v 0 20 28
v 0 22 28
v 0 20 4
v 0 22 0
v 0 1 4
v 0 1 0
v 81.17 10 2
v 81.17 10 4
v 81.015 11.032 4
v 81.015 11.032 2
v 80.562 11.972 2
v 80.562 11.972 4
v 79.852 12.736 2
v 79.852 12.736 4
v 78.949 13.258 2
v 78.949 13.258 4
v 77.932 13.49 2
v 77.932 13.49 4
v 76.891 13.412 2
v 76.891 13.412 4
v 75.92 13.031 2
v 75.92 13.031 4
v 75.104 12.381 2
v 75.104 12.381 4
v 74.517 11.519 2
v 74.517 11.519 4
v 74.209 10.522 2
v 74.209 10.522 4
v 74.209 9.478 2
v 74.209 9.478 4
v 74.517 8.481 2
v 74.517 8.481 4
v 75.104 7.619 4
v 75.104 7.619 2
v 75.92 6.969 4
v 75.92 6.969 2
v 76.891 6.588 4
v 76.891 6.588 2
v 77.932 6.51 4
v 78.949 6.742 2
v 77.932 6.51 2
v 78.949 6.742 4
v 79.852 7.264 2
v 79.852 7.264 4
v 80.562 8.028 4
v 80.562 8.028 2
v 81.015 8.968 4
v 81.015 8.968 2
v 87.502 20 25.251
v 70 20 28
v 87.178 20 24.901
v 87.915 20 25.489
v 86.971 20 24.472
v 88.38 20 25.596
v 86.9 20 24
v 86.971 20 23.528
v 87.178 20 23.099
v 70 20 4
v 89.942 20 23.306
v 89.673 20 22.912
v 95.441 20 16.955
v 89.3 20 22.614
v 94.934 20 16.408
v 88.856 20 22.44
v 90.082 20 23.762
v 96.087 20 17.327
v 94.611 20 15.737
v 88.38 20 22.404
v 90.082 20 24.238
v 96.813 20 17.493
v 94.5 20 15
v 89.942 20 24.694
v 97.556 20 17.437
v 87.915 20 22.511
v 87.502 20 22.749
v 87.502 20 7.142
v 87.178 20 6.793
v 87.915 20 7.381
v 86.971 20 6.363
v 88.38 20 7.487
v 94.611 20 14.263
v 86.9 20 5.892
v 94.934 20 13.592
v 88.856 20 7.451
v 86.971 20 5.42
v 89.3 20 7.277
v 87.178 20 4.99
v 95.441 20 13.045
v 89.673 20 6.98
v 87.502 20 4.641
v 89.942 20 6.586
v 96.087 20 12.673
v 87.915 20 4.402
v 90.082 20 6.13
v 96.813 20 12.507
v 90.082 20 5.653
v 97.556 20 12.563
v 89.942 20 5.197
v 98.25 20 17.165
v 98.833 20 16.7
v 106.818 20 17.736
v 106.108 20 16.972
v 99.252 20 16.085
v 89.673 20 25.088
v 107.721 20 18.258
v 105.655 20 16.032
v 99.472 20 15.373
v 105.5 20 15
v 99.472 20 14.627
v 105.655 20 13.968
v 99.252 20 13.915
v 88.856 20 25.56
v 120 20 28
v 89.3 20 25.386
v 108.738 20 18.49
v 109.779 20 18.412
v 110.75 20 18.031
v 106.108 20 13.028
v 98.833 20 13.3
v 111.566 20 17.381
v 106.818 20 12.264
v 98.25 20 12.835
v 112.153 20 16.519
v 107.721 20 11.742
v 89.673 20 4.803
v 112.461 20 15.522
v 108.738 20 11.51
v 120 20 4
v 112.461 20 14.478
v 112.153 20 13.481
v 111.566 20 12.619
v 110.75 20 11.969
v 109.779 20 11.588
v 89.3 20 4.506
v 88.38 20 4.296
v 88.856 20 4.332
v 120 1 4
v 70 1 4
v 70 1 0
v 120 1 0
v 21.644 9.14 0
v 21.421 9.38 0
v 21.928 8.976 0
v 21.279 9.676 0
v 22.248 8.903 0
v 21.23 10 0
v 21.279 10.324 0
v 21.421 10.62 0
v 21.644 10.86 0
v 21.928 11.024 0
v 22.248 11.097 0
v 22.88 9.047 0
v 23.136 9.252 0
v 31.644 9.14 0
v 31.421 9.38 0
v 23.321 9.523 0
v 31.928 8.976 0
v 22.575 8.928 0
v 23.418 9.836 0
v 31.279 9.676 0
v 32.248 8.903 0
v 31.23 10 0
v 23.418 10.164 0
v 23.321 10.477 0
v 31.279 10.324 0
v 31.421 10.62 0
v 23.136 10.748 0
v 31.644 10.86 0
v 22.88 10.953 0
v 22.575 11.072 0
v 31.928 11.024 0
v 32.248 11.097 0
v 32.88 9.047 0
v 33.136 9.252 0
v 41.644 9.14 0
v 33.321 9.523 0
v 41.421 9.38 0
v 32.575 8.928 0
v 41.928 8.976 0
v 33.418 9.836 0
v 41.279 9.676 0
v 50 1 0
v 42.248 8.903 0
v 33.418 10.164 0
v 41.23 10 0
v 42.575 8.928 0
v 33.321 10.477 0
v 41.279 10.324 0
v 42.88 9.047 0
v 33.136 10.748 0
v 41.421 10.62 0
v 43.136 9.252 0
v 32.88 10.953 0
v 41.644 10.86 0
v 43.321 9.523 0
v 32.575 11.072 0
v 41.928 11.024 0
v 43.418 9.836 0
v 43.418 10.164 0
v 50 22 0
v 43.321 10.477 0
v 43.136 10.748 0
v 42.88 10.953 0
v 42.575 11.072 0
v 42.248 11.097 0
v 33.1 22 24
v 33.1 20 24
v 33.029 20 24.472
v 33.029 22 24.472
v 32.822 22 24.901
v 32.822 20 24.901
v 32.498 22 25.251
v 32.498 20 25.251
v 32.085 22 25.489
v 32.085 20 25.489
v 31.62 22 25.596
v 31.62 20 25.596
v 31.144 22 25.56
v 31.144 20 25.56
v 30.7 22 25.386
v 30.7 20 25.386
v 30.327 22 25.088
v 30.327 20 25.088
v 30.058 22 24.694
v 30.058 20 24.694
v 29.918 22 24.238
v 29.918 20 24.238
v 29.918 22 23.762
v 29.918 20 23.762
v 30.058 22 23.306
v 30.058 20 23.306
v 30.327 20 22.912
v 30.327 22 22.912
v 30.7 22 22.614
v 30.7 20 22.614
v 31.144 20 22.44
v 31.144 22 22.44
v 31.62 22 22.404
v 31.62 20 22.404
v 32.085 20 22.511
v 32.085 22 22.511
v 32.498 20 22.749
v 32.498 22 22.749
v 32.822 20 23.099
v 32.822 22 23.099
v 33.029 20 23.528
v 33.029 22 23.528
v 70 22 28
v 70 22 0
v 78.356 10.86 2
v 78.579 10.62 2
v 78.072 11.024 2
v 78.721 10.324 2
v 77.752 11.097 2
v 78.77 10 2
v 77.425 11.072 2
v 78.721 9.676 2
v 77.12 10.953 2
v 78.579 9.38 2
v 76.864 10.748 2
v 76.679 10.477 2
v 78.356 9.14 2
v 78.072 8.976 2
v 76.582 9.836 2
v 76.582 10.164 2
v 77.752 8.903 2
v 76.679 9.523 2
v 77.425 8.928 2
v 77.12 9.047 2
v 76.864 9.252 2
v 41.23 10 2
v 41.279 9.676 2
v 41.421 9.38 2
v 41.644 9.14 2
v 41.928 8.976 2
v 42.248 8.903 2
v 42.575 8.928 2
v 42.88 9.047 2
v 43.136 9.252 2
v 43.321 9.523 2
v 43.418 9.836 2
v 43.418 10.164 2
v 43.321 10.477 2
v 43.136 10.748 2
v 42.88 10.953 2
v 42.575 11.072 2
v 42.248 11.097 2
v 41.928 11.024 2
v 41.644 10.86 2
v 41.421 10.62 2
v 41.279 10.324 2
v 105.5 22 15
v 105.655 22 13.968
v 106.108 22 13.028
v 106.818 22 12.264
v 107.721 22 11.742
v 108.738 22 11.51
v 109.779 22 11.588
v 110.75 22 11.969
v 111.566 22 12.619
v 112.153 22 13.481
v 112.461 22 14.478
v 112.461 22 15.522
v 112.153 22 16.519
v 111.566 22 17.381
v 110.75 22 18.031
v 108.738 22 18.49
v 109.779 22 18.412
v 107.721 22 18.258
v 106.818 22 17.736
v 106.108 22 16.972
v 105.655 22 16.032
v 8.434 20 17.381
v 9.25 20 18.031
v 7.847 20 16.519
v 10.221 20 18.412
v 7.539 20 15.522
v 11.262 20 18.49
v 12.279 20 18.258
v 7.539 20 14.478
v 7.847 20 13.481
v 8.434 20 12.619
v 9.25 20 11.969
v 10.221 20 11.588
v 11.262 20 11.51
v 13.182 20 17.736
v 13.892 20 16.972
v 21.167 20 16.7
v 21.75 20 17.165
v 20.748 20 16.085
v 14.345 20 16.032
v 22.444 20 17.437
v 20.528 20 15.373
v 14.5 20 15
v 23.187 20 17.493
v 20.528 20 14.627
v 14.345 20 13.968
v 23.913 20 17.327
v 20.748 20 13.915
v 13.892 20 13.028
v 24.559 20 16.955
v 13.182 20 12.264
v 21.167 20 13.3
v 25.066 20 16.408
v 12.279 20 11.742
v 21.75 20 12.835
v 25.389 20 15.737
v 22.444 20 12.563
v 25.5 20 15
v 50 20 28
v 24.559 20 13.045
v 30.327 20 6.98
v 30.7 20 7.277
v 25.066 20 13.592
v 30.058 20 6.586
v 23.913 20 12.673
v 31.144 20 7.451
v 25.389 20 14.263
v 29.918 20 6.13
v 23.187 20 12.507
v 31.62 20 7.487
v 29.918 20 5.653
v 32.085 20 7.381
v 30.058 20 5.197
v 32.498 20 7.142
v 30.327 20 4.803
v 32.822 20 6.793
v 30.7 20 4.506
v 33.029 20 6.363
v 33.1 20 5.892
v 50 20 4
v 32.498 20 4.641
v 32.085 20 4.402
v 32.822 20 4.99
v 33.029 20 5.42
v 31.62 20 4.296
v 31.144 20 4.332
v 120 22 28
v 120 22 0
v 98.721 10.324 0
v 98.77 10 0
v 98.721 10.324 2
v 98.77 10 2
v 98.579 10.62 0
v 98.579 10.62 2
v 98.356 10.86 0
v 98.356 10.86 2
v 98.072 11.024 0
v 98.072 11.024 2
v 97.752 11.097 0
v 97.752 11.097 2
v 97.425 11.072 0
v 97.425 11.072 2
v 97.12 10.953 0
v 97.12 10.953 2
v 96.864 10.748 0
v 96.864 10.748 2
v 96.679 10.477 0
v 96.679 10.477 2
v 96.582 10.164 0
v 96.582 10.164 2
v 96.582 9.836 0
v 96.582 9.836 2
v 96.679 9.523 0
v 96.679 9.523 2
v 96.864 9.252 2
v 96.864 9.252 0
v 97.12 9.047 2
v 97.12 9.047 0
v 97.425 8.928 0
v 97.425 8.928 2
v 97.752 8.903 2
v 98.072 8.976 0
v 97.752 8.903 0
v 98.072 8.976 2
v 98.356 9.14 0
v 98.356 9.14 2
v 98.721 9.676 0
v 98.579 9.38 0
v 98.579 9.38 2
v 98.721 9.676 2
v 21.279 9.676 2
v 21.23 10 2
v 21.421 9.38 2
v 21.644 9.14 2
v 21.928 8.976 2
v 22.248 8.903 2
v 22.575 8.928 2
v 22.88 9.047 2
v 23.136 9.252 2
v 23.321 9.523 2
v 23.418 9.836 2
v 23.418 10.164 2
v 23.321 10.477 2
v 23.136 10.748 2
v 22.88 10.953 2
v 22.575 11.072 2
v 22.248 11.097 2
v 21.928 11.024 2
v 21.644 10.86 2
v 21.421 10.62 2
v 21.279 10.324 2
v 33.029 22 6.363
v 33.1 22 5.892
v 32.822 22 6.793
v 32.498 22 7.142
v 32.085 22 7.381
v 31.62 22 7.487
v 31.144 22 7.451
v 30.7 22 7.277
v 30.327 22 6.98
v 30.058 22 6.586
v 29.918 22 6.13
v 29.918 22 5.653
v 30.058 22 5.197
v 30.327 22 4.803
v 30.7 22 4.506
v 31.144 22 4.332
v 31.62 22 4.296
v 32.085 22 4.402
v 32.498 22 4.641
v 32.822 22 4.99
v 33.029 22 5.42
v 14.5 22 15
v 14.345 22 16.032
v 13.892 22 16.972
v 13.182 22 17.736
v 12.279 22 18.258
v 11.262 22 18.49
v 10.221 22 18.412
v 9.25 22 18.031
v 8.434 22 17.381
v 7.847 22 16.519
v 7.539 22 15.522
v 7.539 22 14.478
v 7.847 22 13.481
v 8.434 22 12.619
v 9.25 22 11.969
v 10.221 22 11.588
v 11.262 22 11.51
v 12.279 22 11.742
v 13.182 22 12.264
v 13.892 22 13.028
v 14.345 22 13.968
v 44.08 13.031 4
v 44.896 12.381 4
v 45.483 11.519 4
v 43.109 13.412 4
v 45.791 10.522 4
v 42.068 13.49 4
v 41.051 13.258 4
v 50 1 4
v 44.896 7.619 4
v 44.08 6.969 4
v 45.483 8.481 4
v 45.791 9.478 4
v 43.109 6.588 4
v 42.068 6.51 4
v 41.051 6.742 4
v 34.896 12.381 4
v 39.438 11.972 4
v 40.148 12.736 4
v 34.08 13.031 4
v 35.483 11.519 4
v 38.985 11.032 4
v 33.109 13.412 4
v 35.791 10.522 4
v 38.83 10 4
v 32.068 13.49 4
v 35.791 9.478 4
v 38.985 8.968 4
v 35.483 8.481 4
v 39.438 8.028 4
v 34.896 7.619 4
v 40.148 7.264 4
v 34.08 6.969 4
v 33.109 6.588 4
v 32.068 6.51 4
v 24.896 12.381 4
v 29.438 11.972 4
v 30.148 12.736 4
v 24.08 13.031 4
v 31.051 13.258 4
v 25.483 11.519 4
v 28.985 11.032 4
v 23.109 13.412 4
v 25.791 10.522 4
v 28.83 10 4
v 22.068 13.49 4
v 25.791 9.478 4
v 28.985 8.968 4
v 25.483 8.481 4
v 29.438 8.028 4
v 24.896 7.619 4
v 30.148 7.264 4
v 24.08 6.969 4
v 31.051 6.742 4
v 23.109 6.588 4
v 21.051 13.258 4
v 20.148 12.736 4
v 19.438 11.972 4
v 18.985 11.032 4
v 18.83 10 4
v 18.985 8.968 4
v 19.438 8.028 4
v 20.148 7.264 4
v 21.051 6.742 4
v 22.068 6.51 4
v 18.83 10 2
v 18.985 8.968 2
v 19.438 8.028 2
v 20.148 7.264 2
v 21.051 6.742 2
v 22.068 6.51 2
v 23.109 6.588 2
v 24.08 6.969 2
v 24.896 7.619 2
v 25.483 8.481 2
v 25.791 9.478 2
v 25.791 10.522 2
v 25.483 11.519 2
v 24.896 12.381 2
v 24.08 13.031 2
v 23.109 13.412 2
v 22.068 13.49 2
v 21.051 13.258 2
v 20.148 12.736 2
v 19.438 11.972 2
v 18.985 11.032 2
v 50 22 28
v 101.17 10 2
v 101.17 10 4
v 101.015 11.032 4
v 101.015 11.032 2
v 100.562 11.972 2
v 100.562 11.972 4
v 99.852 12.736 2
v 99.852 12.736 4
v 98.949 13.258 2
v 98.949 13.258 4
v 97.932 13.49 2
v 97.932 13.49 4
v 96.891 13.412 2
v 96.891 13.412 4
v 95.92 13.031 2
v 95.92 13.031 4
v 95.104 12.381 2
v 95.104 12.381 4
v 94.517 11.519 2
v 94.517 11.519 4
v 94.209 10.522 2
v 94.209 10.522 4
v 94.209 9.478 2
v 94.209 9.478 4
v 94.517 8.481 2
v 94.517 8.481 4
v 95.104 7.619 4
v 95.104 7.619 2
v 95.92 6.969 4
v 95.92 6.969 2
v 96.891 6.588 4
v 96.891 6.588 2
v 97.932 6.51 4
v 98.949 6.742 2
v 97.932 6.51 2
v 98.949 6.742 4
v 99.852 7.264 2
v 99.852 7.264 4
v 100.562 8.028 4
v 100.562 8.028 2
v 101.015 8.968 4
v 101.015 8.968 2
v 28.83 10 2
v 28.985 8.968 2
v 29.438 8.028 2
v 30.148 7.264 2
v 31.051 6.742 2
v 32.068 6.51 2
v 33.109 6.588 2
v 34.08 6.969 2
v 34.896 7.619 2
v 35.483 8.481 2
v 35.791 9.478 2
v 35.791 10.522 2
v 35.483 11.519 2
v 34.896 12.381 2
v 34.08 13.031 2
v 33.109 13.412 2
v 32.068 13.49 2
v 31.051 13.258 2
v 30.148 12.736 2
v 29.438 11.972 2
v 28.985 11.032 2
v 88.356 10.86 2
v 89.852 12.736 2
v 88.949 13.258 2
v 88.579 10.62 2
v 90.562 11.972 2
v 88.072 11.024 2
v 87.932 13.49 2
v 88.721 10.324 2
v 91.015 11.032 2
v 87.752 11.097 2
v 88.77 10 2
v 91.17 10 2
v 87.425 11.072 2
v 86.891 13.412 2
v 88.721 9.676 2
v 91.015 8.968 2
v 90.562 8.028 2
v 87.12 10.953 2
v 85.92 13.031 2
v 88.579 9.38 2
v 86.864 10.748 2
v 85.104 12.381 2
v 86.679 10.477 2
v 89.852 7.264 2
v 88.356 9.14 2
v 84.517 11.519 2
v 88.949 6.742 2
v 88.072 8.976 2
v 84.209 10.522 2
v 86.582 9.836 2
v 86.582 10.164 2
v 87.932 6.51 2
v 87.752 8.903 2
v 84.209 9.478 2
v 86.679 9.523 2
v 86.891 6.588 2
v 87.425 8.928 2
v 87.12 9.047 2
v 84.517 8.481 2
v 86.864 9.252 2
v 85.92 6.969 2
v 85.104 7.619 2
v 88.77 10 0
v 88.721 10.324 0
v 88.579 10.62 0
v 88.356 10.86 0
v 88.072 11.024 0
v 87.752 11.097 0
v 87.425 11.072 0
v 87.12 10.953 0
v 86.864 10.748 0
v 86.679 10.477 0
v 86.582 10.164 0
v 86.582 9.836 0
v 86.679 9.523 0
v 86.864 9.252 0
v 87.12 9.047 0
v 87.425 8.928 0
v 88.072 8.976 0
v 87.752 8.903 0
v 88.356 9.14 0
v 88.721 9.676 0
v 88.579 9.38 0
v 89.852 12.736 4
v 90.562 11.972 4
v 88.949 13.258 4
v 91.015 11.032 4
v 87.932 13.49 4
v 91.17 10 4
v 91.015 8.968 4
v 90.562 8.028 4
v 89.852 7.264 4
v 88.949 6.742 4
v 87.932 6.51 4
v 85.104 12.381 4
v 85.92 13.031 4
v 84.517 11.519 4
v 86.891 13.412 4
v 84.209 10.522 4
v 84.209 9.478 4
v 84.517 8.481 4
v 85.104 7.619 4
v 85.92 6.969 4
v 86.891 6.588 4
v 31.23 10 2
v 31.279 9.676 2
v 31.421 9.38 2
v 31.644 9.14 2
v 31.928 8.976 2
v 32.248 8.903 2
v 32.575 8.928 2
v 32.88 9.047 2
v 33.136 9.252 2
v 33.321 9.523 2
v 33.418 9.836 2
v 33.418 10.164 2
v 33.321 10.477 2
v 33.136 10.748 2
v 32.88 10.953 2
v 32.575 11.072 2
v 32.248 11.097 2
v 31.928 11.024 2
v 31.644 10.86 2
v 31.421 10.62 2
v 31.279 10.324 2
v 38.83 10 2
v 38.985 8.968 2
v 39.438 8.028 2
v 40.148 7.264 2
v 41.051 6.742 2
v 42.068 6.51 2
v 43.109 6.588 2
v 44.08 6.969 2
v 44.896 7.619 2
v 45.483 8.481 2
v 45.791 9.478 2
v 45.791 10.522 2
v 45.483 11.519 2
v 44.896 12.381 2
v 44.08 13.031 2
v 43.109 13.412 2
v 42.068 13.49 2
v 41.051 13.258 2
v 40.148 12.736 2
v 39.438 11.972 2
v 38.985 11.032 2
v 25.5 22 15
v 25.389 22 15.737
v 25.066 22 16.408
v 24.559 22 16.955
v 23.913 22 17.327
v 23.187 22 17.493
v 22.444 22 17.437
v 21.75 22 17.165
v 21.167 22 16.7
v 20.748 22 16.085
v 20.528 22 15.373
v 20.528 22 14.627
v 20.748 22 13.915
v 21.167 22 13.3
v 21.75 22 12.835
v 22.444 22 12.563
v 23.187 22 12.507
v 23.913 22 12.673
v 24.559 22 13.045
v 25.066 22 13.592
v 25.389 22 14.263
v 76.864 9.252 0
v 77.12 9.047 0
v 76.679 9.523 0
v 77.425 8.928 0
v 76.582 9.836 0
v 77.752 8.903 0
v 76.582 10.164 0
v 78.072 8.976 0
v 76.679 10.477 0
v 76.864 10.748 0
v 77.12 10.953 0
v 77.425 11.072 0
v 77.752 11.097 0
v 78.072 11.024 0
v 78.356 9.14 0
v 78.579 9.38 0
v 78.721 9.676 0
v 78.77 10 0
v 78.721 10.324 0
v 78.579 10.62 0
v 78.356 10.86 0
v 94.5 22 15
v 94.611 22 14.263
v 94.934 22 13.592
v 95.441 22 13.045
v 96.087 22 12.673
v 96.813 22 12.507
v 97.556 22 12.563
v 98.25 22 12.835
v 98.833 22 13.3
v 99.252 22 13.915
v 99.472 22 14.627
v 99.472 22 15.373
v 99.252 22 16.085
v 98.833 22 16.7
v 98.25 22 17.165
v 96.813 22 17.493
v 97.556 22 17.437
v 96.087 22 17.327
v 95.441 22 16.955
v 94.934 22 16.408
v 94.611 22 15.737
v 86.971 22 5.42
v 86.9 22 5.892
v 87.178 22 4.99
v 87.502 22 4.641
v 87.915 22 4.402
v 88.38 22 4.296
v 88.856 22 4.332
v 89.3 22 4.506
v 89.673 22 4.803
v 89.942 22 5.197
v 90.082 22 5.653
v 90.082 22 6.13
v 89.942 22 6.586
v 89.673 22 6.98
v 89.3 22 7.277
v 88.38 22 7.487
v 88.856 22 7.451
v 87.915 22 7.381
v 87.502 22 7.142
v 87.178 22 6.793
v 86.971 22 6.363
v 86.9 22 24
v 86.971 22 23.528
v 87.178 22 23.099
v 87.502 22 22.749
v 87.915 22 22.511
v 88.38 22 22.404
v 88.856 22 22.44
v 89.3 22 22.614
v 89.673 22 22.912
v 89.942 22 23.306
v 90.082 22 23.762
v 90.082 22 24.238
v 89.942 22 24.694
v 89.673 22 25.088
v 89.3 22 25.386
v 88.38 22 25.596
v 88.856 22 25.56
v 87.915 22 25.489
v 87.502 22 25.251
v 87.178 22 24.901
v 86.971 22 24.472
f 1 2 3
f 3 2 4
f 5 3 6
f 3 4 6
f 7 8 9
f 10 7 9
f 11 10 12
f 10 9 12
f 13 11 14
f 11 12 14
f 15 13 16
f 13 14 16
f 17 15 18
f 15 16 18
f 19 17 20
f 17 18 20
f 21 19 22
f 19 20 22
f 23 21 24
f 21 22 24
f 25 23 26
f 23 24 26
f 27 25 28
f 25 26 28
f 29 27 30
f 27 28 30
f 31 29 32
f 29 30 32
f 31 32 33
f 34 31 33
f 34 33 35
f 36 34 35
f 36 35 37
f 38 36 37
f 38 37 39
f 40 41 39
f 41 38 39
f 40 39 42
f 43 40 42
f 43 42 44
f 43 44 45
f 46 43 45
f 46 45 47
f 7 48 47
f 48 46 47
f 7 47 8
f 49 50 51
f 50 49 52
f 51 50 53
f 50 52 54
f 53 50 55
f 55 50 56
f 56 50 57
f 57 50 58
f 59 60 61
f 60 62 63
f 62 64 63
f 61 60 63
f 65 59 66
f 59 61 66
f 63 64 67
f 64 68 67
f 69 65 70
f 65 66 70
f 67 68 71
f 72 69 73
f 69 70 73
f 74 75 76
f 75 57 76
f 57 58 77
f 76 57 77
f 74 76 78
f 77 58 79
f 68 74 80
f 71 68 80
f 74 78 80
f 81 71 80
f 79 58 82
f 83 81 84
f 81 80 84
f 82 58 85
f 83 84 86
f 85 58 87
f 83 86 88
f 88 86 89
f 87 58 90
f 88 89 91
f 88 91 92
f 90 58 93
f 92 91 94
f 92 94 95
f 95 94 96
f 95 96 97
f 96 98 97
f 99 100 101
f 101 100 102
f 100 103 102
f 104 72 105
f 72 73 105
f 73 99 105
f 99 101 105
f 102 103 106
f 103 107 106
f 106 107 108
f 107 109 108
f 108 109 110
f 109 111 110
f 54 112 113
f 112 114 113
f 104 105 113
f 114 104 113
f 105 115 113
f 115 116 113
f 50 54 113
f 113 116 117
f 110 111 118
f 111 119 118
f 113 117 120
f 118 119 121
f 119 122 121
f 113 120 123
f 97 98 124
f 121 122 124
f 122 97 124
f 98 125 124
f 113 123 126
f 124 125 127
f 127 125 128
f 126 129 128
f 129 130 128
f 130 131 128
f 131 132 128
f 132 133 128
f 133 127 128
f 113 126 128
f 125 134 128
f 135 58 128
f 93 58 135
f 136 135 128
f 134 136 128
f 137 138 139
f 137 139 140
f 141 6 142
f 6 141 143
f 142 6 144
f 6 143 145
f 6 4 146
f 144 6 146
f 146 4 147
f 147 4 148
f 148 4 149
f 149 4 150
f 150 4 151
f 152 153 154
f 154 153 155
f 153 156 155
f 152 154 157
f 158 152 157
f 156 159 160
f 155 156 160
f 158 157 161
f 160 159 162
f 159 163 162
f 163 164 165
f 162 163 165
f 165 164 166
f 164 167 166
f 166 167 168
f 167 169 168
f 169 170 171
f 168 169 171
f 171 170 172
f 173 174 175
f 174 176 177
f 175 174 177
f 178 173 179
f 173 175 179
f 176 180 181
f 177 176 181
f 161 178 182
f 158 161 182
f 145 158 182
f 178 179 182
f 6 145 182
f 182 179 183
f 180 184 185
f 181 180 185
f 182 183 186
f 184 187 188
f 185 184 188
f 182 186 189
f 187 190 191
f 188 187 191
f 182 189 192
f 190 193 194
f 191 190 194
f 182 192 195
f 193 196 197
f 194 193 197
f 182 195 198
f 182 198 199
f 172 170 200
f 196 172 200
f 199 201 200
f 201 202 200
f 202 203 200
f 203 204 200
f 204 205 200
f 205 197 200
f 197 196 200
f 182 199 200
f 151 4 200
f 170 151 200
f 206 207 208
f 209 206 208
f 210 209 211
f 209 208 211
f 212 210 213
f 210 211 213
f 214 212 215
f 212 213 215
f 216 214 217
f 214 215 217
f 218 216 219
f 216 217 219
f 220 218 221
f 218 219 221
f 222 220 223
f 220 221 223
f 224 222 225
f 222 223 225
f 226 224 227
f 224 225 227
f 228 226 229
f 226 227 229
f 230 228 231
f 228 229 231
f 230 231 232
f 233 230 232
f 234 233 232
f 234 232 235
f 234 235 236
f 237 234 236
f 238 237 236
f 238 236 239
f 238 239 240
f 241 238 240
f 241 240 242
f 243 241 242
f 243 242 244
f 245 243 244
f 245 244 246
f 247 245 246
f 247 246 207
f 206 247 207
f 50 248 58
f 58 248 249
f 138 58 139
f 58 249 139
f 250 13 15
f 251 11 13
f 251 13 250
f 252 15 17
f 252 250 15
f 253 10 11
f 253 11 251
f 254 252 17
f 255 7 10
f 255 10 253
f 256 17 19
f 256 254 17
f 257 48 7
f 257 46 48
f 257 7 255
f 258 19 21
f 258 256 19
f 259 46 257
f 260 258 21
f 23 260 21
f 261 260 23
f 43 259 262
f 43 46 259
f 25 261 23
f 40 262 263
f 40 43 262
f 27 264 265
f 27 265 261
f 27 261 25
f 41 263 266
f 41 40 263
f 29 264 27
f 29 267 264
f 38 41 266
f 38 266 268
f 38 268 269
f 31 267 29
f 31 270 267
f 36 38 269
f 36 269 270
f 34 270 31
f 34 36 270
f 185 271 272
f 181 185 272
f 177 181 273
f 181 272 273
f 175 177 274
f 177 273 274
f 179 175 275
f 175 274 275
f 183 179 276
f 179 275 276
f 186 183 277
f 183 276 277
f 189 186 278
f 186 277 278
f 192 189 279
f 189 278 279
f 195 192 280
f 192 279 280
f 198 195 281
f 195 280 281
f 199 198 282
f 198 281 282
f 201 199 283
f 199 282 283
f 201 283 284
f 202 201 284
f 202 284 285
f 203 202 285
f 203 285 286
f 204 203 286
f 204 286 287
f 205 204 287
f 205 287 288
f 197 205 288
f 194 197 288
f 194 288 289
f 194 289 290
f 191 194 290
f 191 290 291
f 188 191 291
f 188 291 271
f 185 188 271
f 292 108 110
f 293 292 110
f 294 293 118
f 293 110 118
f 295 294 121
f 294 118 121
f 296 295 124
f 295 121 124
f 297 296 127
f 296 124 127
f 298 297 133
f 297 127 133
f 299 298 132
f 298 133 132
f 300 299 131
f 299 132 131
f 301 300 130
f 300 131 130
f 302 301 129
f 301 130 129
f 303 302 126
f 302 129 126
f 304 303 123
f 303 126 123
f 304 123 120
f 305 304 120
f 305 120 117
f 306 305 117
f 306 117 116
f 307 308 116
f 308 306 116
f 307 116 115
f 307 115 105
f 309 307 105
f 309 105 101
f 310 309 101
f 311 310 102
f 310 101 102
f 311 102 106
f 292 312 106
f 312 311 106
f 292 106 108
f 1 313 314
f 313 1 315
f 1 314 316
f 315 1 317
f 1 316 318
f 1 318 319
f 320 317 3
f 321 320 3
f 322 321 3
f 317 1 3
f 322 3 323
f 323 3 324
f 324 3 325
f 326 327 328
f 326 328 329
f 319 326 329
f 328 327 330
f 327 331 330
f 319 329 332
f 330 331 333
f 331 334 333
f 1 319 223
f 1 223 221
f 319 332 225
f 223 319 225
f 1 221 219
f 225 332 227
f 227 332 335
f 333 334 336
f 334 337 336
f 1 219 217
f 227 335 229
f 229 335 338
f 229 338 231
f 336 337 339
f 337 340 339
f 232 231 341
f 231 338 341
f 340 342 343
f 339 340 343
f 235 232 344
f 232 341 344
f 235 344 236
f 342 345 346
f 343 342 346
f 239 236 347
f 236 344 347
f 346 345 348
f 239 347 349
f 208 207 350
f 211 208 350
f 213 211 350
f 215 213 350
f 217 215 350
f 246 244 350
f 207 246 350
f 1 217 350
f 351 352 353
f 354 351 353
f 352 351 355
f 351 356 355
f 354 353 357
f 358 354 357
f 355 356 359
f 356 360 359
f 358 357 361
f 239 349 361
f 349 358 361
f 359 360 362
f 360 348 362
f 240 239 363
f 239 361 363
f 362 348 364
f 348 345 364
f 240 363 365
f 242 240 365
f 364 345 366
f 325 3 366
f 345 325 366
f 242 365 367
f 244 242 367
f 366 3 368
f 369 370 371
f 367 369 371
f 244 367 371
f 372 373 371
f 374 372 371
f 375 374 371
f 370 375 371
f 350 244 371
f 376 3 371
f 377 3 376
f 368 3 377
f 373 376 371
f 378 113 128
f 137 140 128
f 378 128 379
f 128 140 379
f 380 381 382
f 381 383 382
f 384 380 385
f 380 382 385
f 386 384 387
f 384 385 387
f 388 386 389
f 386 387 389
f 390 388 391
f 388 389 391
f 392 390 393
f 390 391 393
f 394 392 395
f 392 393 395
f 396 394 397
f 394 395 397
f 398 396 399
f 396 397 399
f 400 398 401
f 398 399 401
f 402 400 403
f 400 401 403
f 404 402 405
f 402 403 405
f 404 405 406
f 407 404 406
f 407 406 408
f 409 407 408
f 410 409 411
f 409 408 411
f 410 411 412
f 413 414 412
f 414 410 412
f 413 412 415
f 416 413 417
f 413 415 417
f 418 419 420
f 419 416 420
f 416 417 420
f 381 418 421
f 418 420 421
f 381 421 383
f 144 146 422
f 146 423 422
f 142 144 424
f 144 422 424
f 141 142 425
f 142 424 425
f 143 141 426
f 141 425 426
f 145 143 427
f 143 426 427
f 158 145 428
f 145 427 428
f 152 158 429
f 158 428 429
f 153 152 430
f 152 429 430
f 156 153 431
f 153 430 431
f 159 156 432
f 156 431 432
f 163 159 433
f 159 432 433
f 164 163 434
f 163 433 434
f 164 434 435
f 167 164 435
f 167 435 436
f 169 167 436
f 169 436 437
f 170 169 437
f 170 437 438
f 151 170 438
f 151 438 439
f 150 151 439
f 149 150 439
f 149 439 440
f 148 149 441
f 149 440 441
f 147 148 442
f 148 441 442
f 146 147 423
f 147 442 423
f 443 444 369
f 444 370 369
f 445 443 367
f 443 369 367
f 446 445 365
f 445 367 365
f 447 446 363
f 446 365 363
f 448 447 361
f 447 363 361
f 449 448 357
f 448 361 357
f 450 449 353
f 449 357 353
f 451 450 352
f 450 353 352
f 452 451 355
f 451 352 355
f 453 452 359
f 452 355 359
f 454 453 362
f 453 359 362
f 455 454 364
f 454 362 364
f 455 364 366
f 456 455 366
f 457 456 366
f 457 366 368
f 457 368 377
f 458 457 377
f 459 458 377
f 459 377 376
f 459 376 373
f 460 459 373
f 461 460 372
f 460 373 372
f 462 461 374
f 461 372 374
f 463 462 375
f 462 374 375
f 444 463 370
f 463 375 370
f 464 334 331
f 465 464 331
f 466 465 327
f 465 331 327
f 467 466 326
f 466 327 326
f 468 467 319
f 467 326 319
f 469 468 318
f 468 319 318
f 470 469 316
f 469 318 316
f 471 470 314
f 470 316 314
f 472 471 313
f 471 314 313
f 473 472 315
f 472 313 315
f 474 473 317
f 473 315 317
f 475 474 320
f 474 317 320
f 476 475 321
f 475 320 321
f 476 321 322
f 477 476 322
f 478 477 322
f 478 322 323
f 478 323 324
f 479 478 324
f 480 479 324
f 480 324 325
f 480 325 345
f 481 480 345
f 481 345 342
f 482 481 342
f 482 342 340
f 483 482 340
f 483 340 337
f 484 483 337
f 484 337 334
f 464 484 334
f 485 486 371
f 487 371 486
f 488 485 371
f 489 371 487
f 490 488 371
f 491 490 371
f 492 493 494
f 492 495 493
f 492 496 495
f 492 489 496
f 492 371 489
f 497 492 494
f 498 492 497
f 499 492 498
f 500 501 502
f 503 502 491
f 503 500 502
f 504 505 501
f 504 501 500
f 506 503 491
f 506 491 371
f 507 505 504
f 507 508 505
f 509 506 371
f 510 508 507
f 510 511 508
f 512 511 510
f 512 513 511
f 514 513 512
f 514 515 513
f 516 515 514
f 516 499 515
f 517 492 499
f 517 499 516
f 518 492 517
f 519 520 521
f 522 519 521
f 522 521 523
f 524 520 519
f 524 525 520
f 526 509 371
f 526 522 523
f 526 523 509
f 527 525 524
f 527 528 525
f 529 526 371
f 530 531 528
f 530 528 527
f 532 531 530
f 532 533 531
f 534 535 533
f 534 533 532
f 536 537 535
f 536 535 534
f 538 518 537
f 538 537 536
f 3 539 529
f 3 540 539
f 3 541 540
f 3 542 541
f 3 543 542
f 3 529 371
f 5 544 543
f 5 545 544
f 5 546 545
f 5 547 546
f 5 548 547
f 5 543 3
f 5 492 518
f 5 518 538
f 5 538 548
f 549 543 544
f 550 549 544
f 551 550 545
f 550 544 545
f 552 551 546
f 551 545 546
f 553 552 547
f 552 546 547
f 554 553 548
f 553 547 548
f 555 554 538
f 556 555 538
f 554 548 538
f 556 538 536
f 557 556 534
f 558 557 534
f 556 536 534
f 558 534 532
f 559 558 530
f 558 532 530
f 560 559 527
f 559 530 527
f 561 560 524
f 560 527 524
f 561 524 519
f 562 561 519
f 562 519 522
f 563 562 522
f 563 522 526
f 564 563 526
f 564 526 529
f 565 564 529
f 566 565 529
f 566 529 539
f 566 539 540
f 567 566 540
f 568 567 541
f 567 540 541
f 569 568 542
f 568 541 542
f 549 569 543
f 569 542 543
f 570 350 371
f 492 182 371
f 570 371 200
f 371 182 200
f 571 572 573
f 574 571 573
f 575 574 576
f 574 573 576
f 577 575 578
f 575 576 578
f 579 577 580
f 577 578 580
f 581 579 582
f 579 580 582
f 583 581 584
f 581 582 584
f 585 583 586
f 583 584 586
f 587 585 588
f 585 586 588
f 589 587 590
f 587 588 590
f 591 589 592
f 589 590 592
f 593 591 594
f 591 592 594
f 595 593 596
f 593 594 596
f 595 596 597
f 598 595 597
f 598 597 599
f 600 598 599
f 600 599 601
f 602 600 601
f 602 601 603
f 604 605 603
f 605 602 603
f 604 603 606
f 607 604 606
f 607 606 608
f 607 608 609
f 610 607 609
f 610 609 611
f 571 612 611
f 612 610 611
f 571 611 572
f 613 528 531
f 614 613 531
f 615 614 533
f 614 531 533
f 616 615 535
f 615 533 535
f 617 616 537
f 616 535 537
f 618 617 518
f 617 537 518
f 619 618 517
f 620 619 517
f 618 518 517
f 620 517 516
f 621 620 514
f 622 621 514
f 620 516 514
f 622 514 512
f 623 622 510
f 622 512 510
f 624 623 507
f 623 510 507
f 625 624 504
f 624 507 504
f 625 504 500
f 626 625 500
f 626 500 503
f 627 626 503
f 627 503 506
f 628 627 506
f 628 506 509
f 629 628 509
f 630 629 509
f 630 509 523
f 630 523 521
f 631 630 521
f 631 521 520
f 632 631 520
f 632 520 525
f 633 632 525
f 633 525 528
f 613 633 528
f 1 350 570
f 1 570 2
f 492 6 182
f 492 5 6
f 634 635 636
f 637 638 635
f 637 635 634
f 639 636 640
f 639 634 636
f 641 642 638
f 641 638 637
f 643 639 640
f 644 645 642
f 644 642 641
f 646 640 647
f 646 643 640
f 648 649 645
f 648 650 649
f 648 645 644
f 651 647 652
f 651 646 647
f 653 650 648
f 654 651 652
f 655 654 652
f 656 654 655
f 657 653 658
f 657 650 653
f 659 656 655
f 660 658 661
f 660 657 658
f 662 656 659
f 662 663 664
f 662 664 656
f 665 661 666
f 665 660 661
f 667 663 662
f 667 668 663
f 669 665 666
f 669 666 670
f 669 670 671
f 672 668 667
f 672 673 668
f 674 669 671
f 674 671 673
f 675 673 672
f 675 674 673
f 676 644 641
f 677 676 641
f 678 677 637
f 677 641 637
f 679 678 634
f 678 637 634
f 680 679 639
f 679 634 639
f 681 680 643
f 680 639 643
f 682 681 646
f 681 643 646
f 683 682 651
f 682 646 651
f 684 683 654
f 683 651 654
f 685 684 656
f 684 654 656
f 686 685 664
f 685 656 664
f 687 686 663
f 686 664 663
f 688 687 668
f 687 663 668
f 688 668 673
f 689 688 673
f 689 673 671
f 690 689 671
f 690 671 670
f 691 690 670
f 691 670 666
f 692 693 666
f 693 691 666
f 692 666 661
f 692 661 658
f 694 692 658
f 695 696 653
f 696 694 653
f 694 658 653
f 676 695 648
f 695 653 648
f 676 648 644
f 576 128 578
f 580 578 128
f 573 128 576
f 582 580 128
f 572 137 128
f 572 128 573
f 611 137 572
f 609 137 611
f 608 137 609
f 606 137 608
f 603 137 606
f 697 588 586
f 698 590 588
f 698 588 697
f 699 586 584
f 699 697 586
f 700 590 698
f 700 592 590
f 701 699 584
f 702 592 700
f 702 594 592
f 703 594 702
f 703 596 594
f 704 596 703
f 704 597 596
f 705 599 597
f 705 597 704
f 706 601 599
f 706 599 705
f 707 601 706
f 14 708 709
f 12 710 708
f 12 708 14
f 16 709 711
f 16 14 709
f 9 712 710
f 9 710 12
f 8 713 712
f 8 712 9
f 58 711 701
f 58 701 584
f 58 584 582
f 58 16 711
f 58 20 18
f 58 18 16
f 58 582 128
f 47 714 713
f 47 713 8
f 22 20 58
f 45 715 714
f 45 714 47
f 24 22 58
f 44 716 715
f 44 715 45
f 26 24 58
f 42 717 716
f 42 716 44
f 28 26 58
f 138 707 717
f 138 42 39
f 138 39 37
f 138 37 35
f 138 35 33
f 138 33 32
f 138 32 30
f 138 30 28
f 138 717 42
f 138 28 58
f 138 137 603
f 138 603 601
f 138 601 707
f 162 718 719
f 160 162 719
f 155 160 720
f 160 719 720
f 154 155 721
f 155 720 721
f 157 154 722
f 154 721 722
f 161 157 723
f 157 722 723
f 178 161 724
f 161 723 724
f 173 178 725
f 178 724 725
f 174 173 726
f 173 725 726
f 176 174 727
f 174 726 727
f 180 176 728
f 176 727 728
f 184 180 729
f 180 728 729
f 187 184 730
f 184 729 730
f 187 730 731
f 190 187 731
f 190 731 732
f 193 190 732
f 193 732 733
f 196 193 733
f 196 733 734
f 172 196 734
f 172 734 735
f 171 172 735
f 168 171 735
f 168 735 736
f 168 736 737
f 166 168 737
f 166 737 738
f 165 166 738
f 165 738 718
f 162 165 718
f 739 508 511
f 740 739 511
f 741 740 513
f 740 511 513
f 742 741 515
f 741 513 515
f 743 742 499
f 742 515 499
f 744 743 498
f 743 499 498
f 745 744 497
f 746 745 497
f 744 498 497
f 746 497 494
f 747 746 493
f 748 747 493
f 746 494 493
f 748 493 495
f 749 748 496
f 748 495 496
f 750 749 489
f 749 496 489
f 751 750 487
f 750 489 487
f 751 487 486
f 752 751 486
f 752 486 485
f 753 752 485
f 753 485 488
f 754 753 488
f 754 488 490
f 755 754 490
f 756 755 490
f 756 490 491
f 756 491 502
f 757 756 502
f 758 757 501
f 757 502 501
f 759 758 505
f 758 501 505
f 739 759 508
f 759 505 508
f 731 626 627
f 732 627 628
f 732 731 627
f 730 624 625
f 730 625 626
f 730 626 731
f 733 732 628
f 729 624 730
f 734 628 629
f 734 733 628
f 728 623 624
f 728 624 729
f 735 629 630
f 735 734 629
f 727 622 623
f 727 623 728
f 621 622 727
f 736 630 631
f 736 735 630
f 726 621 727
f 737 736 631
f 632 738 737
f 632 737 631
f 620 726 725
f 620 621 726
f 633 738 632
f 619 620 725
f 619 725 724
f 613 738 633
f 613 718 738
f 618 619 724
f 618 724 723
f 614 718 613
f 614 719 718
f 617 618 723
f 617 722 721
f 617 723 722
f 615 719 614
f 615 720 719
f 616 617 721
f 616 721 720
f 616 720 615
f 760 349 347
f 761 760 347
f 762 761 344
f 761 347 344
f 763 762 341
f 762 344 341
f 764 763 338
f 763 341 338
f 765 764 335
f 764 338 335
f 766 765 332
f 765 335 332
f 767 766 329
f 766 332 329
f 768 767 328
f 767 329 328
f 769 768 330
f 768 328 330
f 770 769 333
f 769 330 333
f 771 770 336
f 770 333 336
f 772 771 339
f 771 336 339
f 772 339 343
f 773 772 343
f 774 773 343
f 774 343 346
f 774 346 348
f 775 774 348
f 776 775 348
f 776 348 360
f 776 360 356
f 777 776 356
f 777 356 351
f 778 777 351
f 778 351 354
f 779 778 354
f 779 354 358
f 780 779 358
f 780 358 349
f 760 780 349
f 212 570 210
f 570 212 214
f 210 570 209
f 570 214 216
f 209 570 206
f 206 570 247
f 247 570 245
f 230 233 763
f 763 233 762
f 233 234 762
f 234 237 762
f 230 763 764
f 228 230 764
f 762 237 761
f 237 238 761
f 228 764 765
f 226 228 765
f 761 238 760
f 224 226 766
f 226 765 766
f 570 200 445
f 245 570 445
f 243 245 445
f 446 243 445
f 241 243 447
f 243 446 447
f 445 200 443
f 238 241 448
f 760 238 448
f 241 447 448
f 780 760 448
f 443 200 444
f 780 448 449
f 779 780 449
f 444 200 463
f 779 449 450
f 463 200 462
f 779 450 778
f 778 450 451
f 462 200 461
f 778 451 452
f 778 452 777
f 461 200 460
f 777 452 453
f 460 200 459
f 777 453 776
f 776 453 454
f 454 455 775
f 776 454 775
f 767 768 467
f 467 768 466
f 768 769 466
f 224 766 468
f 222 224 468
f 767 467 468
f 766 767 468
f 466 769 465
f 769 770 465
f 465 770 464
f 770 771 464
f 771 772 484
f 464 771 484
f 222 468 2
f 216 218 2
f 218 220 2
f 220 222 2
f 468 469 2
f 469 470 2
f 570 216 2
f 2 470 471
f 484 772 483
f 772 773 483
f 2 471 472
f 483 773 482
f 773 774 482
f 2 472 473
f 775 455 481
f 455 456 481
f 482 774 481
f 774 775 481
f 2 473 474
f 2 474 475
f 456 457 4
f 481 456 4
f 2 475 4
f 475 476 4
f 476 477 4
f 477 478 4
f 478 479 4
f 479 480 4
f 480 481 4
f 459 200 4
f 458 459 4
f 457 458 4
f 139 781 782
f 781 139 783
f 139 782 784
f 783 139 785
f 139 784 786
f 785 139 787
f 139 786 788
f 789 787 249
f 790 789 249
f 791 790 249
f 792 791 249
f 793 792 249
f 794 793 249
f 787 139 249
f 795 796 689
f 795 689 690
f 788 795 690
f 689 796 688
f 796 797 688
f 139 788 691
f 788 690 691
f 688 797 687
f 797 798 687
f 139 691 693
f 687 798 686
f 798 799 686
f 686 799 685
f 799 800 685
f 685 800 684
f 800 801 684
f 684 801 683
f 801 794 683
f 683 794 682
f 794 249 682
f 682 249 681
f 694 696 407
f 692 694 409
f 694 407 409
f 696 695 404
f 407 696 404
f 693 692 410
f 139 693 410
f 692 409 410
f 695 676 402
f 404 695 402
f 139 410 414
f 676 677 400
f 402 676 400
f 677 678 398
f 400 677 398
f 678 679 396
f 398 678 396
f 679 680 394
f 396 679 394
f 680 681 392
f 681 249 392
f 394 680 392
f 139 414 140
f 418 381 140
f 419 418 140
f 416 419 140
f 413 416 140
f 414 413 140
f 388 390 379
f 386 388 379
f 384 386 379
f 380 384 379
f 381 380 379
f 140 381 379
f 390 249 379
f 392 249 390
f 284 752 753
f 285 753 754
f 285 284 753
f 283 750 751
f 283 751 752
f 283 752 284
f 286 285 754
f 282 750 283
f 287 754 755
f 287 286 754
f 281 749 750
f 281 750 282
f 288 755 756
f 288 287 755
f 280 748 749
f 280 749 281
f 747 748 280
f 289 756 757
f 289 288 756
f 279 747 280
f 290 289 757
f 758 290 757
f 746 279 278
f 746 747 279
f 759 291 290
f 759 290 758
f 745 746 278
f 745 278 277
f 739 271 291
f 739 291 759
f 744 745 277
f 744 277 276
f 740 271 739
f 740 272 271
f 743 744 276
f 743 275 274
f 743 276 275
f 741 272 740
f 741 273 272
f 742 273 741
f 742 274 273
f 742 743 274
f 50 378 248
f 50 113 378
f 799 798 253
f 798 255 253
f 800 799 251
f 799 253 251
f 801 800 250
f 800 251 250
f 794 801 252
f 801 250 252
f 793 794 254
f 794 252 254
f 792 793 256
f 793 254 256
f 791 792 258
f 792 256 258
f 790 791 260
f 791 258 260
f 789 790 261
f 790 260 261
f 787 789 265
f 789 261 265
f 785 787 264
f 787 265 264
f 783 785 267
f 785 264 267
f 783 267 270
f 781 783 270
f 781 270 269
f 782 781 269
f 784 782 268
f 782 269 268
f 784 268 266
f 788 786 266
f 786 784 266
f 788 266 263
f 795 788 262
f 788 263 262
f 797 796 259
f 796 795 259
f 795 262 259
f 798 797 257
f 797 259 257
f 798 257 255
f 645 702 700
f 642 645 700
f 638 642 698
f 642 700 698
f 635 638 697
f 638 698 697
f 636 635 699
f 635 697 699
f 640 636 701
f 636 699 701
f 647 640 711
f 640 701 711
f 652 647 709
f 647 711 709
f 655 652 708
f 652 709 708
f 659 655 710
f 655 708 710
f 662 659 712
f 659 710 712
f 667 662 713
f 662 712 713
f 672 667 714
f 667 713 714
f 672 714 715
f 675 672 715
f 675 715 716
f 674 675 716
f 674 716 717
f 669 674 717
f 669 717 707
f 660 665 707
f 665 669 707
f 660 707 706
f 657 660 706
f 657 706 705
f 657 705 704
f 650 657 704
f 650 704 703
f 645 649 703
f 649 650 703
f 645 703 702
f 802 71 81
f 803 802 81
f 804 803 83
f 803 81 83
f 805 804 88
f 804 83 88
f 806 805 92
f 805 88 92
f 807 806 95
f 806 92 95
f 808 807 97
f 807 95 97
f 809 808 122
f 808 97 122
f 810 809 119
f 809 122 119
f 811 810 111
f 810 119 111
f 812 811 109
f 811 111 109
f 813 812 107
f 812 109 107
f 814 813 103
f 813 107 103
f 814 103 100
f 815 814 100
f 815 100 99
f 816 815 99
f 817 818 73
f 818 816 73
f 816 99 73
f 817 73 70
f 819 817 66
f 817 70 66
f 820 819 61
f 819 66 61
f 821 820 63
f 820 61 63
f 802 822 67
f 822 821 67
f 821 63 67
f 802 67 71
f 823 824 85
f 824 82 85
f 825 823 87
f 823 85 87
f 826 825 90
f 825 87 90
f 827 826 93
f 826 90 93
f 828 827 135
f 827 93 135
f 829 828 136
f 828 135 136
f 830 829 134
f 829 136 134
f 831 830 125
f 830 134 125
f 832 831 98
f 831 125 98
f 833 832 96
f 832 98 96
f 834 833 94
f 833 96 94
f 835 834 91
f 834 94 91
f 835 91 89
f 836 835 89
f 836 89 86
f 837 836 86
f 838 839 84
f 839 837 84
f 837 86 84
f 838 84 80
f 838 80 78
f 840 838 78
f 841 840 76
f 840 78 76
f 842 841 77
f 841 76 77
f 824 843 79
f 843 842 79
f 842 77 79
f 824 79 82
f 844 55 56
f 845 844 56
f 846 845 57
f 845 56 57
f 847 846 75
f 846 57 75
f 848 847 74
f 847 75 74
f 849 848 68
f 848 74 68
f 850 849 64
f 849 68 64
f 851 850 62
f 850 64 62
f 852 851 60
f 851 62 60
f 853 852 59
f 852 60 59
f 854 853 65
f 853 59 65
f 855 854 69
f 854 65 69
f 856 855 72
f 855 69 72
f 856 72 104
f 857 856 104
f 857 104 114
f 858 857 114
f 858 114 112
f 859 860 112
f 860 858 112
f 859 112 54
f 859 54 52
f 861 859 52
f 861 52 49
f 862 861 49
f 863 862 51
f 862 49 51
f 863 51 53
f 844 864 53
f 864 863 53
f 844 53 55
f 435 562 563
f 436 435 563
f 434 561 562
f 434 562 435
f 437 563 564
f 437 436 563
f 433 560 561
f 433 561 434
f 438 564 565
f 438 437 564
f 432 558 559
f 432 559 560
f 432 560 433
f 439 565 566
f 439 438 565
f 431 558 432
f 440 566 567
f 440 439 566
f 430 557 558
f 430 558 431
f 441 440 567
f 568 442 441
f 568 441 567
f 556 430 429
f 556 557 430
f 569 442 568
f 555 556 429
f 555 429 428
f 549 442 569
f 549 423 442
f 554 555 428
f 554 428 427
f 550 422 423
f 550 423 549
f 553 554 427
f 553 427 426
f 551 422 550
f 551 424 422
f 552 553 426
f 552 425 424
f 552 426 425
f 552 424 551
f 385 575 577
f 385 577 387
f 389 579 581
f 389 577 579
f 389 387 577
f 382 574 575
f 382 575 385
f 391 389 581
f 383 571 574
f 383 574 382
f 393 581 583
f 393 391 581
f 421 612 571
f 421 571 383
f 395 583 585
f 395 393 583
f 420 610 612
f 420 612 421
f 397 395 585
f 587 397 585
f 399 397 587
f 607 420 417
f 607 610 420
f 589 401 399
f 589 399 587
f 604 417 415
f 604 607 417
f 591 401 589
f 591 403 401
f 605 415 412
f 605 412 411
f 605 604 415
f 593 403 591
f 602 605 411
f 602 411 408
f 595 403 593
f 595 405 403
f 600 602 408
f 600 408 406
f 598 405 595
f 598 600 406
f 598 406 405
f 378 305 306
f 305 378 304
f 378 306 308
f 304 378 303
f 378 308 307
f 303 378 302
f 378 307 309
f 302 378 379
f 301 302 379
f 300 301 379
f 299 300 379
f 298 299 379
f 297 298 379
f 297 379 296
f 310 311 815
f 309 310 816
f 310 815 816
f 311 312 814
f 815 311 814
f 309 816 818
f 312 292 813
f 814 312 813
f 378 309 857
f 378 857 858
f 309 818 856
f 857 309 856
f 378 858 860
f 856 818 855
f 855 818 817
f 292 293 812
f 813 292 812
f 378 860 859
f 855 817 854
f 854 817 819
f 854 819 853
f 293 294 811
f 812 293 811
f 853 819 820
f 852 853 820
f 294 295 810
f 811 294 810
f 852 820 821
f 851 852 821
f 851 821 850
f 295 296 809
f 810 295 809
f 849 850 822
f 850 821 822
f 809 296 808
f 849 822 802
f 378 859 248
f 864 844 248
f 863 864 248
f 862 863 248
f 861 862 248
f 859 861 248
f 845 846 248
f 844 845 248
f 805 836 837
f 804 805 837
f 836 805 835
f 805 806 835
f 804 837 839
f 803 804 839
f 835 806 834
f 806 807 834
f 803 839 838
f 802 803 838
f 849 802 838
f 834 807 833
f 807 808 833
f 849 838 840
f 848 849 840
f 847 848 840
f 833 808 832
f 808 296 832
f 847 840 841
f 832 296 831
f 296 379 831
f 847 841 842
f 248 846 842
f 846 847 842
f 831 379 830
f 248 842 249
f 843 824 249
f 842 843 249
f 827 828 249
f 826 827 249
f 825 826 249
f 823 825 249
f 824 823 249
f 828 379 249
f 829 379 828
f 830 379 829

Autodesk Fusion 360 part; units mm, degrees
sketch "Sketch1" plane through (0, 0, 0) normal (0, 0, 1) x (1, 0, 0)
  line L0 (0, 0) -> (50, 0)
  line L1 (50, 0) -> (50, 22)
  line L2 (50, 22) -> (0, 22)
  line L3 (0, 22) -> (0, 0)
  dimension "d1" = 50
  dimension "d2" = 22
extrude "Extrude1" add sketch "Sketch1" along normal blind 25 makes body 1
sketch "Sketch2" plane through (0, 0, 25) normal (0, 0, 1) x (-1, 0, 0)
  line L0 (0, -22) -> (0, 0)
  line L1 (0, 0) -> (-50, 0)
  line L2 (-50, 0) -> (-50, -22)
  line L3 (-50, -22) -> (0, -22)
  line L4 (-50, 0) -> (0, 0)
  line L5 (0, 0) -> (0, -20)
  line L6 (0, -20) -> (-50, -20)
  line L7 (-50, -20) -> (-50, 0)
extrude "Extrude2" cut sketch "Sketch2" against normal blind 21 contours L0 L1 L2 L4 L5 L6 L7 bodies 1
sketch "Sketch3" plane through (0, 0, 0) normal (0, 1, 0) x (1, 0, 0)
sketch "Sketch4" plane through (0, 0, 25) normal (0, 0, 1) x (-1, 0, 0)
  line L0 (0, -20) -> (-50, -20)
  line L1 (-50, -20) -> (-50, -22)
  line L2 (-50, -22) -> (0, -22)
  line L3 (0, -22) -> (0, -20)
  line L4 (0, -20) -> (-50, -20)
  line L5 (-50, -20) -> (-50, -22)
  line L6 (-50, -22) -> (0, -22)
  line L7 (0, -22) -> (0, -20)
extrude "Extrude3" add sketch "Sketch4" along normal blind 3 bodies 1
sketch "Sketch5" plane through (0, 0, 0) normal (0, 1, 0) x (1, 0, 0)
  circle A0 centre (31.5, -24) radius 1.6
  circle A1 centre (11, -15) radius 3.5
  circle A2 centre (31.5, -5.8915) radius 1.6
  dimension "d11" = 3.2
  dimension "d14" = 7
  dimension "d16" = 3.2
sketch "Sketch6" plane through (0, 0, 0) normal (0, 1, 0) x (1, 0, 0)
  circle A0 centre (23, -15) radius 2.5
  dimension "d18" = 5
extrude "Extrude4" cut sketch "Sketch6" sketch "Sketch5" along normal blind 25 of sketch 2 bodies 1
ref_plane "WorkPlane1" through (60, 11, 14) normal (1, 0, 0) x (0, 1, 0)
sketch "Sketch7" plane through (0, 0, 0) normal (0, -1, 0) x (1, 0, 0)
  line L0 (50, 4) -> (0, 4)
  line L1 (0, 4) -> (0, 0)
  line L2 (0, 0) -> (50, 0)
  line L3 (50, 0) -> (50, 4)
sketch "Sketch8" plane through (0, 0, 0) normal (0, 0, 1) x (1, 0, 0)
extrude "Extrude5" cut sketch "Sketch7" against normal blind 1 bodies 1
sketch "Sketch9" plane through (0, 0, 4) normal (0, 0, 1) x (-1, 0, 0)
  line L0 (0, -1) -> (-50, -1)
  line L1 (-50, -1) -> (-50, -20)
  line L2 (-50, -20) -> (0, -20)
  line L3 (0, -20) -> (0, -1)
sketch "Sketch10" plane through (0, 20, 0) normal (0, -1, 0) x (1, 0, 0)
  circle A0 centre (109, 15) radius 3.5
  circle A1 centre (97, 15) radius 2.5
  circle A2 centre (88.5, 5.8915) radius 1.6
  circle A3 centre (88.5, 24) radius 1.6
  line L0 (120, 4) -> (120, 28)
  line L1 (120, 28) -> (70, 28)
  line L2 (70, 28) -> (70, 4)
  line L3 (70, 4) -> (120, 4)
sketch "Sketch11" plane through (0, 0, 4) normal (0, 0, 1) x (-1, 0, 0)
  circle A0 centre (-42.33, -10) radius 1.1
  circle A1 centre (-32.33, -10) radius 1.1
  circle A2 centre (-22.33, -10) radius 1.1
  circle A3 centre (-22.33, -10) radius 3.5
  circle A4 centre (-32.33, -10) radius 3.5
  circle A5 centre (-42.33, -10) radius 3.5
  dimension "d30" = 2.2
  dimension "d31" = 10
  dimension "d32" = 2.2
  dimension "d33" = 10
  dimension "d34" = 2.2
  dimension "d37" = 7
  dimension "d38" = 7
  dimension "d39" = 7
extrude "Extrude6" cut sketch "Sketch11" against normal blind 21 contours A0 | A1 | A2 bodies 1
sketch "Sketch12" plane through (0, 20, 0) normal (0, -1, 0) x (1, 0, 0)
extrude "Extrude7" cut sketch "Sketch11" against normal blind 2 bodies 1
mirror "Mirror2" about plane through (60, 11, 14) normal (1, 0, 0) of bodies 1 makes body 2
